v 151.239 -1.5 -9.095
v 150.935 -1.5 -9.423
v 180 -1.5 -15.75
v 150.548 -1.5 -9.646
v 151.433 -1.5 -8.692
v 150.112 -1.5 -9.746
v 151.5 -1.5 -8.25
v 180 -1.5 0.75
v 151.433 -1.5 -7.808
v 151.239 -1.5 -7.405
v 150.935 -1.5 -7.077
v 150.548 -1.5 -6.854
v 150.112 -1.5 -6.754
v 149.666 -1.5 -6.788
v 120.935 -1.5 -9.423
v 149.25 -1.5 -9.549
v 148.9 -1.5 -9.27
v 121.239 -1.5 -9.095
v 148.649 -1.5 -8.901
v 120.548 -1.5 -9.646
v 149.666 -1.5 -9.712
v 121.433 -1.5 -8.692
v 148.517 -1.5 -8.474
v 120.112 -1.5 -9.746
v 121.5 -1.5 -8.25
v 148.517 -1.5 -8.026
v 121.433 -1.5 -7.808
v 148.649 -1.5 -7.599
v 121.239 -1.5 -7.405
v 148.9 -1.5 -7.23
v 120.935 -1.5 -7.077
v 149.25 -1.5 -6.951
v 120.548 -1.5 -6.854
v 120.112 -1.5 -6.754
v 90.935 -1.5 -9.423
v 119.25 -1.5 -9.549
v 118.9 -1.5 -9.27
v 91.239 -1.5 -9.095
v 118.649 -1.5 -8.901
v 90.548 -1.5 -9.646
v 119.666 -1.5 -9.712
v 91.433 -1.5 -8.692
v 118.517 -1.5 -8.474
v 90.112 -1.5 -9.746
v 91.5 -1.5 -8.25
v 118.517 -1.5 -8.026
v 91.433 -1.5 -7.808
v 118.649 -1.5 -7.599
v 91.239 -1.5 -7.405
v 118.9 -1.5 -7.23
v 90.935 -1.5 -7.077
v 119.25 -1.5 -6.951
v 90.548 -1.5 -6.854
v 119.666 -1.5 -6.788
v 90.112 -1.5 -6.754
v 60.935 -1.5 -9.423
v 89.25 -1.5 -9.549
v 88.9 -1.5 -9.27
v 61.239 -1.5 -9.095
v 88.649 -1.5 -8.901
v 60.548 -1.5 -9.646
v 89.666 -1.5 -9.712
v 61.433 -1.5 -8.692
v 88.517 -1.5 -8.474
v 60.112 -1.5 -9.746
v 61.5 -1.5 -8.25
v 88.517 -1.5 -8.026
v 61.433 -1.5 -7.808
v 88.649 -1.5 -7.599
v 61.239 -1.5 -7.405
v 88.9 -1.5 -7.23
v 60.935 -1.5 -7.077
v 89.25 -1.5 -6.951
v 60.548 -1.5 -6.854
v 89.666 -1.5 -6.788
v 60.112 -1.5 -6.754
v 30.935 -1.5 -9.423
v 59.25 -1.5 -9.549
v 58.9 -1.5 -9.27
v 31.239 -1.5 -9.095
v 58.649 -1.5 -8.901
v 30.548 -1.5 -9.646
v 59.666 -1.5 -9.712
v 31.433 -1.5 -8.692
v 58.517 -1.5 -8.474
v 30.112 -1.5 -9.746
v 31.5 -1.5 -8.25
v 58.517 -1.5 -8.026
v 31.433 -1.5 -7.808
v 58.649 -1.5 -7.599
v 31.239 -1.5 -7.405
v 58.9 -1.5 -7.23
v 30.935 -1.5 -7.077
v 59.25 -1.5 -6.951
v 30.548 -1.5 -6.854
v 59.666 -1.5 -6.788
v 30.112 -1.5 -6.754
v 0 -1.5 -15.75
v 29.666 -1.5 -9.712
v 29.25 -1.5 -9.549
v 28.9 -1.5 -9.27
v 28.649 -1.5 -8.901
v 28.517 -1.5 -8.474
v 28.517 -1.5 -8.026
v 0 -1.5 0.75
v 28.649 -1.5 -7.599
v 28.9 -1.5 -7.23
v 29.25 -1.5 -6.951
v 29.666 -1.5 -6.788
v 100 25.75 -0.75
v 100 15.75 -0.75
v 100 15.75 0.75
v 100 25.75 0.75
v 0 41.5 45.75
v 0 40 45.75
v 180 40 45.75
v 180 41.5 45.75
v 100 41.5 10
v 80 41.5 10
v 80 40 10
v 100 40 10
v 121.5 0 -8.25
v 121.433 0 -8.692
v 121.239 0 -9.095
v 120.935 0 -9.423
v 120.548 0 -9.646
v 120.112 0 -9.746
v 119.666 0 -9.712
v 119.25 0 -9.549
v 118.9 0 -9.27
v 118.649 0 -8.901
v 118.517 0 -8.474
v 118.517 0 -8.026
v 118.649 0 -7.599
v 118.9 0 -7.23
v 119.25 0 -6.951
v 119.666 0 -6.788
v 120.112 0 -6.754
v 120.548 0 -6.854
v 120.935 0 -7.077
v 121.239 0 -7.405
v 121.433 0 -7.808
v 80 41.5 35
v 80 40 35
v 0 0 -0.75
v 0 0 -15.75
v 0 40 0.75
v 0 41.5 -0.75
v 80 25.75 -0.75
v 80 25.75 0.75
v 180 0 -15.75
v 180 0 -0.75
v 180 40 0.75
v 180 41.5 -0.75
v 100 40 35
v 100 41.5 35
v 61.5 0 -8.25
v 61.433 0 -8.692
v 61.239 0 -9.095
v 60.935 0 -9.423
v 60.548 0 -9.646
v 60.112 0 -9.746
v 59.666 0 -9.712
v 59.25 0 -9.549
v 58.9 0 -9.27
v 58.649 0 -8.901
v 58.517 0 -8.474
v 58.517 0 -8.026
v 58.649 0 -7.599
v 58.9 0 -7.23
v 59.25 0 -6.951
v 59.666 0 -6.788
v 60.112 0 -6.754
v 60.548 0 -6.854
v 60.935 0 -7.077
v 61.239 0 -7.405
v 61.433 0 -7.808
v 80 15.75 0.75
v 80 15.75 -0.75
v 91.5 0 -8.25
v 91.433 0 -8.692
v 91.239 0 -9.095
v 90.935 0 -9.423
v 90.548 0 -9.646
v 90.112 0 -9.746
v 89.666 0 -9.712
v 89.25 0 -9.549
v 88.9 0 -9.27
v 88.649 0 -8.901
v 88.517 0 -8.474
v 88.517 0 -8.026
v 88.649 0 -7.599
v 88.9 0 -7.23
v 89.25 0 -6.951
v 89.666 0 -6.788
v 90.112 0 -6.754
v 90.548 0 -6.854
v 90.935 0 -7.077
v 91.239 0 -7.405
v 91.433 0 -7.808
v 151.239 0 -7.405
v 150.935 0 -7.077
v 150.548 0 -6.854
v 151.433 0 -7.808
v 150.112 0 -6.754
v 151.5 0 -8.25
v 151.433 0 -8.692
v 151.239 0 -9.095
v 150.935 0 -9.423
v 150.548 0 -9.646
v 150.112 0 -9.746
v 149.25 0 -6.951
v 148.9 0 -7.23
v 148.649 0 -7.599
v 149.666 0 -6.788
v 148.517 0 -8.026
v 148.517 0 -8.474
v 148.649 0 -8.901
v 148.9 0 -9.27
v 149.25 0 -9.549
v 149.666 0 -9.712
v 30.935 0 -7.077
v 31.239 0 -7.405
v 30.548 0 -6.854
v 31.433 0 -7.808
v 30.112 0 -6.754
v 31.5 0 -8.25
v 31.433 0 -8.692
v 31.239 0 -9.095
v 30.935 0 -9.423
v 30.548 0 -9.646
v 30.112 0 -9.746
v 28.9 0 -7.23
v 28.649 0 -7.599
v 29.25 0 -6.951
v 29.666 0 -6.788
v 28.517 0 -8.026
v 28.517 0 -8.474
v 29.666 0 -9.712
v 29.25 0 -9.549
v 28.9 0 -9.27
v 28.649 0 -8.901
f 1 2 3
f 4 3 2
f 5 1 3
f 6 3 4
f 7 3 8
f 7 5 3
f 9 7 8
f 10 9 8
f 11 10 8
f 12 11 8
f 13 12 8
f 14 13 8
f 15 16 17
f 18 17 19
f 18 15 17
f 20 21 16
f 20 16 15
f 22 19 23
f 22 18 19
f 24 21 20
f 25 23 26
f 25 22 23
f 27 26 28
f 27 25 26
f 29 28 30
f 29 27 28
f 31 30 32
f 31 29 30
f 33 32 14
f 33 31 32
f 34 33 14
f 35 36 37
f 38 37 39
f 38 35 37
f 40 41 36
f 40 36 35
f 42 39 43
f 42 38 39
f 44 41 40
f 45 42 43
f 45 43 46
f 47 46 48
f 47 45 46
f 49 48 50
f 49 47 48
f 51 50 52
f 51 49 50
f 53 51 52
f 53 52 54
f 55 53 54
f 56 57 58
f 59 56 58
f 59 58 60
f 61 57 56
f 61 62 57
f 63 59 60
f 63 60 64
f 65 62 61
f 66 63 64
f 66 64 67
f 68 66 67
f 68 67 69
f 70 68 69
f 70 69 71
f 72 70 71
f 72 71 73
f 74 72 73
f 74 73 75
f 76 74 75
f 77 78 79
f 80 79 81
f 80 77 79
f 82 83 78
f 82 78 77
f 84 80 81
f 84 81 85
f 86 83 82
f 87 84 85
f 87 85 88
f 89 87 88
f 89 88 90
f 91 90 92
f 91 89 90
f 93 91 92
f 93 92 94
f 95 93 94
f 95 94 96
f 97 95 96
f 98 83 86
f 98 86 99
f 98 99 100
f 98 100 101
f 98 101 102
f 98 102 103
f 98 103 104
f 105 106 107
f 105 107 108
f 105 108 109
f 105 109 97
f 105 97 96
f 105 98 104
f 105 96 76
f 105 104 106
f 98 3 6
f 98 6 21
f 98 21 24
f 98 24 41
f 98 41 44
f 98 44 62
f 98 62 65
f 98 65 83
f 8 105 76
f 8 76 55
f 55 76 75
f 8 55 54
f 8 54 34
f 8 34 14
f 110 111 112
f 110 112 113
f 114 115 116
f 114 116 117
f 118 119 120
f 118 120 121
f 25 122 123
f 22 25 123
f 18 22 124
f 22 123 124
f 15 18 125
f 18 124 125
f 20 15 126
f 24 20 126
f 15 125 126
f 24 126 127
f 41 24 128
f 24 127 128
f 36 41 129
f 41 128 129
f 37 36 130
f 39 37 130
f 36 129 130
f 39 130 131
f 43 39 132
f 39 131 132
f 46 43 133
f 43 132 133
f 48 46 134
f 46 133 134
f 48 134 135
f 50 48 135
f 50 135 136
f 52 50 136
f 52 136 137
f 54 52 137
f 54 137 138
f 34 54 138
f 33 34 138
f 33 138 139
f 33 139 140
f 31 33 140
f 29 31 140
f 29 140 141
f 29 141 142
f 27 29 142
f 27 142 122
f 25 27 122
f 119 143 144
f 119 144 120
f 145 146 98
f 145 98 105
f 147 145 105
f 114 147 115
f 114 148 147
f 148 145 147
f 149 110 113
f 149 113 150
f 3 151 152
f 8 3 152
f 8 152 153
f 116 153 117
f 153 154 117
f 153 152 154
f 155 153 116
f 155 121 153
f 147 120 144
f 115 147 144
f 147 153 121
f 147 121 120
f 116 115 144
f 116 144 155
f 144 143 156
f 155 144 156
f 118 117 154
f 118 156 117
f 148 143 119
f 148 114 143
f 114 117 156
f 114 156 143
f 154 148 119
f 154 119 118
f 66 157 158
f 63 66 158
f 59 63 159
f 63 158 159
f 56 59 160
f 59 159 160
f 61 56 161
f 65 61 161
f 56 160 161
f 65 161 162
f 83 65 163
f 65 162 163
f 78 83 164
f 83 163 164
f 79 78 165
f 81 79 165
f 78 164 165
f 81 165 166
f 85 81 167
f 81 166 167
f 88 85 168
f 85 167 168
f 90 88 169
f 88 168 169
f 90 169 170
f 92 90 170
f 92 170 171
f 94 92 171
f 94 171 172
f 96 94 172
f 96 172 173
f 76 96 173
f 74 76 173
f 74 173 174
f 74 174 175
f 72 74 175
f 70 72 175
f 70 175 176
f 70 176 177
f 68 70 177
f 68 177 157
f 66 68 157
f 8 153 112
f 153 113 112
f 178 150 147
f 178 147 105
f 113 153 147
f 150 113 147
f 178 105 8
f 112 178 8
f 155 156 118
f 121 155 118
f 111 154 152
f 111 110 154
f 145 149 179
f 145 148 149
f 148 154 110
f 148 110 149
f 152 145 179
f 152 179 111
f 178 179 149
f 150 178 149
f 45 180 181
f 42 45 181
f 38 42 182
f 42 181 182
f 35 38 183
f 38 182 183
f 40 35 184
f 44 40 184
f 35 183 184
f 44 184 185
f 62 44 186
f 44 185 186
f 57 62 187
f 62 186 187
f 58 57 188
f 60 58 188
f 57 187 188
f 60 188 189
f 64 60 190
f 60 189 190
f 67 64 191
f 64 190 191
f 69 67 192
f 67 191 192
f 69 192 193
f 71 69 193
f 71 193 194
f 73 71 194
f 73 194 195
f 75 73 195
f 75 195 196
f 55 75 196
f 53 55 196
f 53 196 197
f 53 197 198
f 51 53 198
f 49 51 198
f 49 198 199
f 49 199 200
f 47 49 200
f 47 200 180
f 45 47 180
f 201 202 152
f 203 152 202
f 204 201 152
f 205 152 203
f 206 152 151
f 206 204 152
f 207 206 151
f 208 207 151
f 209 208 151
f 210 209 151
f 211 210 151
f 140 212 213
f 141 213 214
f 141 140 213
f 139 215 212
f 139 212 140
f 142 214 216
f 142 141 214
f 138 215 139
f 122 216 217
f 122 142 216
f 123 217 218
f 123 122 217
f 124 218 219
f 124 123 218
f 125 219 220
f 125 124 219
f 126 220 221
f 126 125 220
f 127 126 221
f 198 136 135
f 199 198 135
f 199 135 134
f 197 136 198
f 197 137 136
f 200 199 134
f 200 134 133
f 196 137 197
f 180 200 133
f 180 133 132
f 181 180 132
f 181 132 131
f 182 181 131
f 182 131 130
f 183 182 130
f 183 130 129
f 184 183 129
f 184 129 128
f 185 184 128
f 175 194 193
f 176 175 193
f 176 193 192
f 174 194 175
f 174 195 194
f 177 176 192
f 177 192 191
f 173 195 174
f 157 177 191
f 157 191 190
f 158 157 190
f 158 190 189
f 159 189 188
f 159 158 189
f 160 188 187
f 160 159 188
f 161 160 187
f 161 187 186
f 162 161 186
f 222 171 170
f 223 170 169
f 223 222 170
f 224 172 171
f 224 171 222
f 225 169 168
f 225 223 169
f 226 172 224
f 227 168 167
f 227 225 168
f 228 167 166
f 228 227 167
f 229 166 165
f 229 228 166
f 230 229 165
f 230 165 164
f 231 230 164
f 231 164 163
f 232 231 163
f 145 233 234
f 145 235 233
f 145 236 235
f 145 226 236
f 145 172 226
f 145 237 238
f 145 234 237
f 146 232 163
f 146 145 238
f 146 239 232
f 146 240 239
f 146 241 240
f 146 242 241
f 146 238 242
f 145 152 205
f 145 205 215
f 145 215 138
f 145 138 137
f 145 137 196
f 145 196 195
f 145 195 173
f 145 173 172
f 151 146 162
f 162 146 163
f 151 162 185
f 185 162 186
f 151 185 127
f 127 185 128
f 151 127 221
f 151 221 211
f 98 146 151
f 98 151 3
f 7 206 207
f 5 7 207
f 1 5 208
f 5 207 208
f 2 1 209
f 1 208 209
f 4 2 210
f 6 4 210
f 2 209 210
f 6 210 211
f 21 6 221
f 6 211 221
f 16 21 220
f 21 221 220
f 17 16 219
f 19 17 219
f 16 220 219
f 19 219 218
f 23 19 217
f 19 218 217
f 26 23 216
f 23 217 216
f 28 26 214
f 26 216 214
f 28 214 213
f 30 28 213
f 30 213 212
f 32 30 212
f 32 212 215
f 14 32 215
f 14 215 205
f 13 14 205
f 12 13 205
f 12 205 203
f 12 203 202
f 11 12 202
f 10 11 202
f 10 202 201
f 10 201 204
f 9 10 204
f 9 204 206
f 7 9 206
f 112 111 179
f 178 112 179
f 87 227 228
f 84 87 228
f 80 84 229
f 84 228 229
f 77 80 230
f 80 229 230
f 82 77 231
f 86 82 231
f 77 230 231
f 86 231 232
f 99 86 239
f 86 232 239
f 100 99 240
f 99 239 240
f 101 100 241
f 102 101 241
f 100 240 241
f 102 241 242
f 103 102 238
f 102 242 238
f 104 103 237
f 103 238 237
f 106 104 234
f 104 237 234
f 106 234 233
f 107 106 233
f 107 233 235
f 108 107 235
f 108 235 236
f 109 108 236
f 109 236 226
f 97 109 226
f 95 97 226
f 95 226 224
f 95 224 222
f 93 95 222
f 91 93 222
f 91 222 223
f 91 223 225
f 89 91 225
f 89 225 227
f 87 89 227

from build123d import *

# Parameters (mm, degrees)
BOSS_EXTRUDE2_DEPTH = 180
SKETCH2_R           = 1.5
CUT_EXTRUDE1_DEPTH  = 10
SKETCH3_W           = 20
SKETCH3_H           = 10
CUT_EXTRUDE2_DEPTH  = 10
SKETCH4_W           = 20
SKETCH4_H           = 25
CUT_EXTRUDE3_DEPTH  = 10


with BuildPart() as part:
    # Sketch1 → Boss-Extrude2 (new body)
    with BuildSketch(Plane(origin=(0, 0, 0), x_dir=(0, 0, -1), z_dir=(1, 0, 0))):
        Polygon((-0.75, 0), (-0.75, 40), (-45.75, 40), (-45.75, 41.5), (0.75, 41.5), (0.75, 0), (15.75, 0), (15.75, -1.5), (-0.75, -1.5), align=None)
    extrude(amount=BOSS_EXTRUDE2_DEPTH)

    # Sketch2 → Cut-Extrude1 (cut)
    with BuildSketch(Plane(origin=(0, 0, 0), x_dir=(1, 0, 0), z_dir=(0, 1, 0))):
        with Locations((120, 8.25)):
            Circle(SKETCH2_R)
        with Locations((90, 8.25)):
            Circle(SKETCH2_R)
        with Locations((150, 8.25)):
            Circle(SKETCH2_R)
        with Locations((60, 8.25)):
            Circle(SKETCH2_R)
        with Locations((30, 8.25)):
            Circle(SKETCH2_R)
    extrude(amount=-CUT_EXTRUDE1_DEPTH, mode=Mode.SUBTRACT)

    # Sketch3 → Cut-Extrude2 (cut)
    with BuildSketch(Plane(origin=(0, 0, -0.75), x_dir=(-1, 0, 0), z_dir=(0, 0, -1))):
        with Locations((-90, 20.75)):
            Rectangle(SKETCH3_W, SKETCH3_H)
    extrude(amount=-CUT_EXTRUDE2_DEPTH, mode=Mode.SUBTRACT)

    # Sketch4 → Cut-Extrude3 (cut)
    with BuildSketch(Plane(origin=(0, 41.5, 0), x_dir=(1, 0, 0), z_dir=(0, 1, 0))):
        with Locations((90, -22.5)):
            Rectangle(SKETCH4_W, SKETCH4_H)
    extrude(amount=-CUT_EXTRUDE3_DEPTH, mode=Mode.SUBTRACT)


solid = part.part
